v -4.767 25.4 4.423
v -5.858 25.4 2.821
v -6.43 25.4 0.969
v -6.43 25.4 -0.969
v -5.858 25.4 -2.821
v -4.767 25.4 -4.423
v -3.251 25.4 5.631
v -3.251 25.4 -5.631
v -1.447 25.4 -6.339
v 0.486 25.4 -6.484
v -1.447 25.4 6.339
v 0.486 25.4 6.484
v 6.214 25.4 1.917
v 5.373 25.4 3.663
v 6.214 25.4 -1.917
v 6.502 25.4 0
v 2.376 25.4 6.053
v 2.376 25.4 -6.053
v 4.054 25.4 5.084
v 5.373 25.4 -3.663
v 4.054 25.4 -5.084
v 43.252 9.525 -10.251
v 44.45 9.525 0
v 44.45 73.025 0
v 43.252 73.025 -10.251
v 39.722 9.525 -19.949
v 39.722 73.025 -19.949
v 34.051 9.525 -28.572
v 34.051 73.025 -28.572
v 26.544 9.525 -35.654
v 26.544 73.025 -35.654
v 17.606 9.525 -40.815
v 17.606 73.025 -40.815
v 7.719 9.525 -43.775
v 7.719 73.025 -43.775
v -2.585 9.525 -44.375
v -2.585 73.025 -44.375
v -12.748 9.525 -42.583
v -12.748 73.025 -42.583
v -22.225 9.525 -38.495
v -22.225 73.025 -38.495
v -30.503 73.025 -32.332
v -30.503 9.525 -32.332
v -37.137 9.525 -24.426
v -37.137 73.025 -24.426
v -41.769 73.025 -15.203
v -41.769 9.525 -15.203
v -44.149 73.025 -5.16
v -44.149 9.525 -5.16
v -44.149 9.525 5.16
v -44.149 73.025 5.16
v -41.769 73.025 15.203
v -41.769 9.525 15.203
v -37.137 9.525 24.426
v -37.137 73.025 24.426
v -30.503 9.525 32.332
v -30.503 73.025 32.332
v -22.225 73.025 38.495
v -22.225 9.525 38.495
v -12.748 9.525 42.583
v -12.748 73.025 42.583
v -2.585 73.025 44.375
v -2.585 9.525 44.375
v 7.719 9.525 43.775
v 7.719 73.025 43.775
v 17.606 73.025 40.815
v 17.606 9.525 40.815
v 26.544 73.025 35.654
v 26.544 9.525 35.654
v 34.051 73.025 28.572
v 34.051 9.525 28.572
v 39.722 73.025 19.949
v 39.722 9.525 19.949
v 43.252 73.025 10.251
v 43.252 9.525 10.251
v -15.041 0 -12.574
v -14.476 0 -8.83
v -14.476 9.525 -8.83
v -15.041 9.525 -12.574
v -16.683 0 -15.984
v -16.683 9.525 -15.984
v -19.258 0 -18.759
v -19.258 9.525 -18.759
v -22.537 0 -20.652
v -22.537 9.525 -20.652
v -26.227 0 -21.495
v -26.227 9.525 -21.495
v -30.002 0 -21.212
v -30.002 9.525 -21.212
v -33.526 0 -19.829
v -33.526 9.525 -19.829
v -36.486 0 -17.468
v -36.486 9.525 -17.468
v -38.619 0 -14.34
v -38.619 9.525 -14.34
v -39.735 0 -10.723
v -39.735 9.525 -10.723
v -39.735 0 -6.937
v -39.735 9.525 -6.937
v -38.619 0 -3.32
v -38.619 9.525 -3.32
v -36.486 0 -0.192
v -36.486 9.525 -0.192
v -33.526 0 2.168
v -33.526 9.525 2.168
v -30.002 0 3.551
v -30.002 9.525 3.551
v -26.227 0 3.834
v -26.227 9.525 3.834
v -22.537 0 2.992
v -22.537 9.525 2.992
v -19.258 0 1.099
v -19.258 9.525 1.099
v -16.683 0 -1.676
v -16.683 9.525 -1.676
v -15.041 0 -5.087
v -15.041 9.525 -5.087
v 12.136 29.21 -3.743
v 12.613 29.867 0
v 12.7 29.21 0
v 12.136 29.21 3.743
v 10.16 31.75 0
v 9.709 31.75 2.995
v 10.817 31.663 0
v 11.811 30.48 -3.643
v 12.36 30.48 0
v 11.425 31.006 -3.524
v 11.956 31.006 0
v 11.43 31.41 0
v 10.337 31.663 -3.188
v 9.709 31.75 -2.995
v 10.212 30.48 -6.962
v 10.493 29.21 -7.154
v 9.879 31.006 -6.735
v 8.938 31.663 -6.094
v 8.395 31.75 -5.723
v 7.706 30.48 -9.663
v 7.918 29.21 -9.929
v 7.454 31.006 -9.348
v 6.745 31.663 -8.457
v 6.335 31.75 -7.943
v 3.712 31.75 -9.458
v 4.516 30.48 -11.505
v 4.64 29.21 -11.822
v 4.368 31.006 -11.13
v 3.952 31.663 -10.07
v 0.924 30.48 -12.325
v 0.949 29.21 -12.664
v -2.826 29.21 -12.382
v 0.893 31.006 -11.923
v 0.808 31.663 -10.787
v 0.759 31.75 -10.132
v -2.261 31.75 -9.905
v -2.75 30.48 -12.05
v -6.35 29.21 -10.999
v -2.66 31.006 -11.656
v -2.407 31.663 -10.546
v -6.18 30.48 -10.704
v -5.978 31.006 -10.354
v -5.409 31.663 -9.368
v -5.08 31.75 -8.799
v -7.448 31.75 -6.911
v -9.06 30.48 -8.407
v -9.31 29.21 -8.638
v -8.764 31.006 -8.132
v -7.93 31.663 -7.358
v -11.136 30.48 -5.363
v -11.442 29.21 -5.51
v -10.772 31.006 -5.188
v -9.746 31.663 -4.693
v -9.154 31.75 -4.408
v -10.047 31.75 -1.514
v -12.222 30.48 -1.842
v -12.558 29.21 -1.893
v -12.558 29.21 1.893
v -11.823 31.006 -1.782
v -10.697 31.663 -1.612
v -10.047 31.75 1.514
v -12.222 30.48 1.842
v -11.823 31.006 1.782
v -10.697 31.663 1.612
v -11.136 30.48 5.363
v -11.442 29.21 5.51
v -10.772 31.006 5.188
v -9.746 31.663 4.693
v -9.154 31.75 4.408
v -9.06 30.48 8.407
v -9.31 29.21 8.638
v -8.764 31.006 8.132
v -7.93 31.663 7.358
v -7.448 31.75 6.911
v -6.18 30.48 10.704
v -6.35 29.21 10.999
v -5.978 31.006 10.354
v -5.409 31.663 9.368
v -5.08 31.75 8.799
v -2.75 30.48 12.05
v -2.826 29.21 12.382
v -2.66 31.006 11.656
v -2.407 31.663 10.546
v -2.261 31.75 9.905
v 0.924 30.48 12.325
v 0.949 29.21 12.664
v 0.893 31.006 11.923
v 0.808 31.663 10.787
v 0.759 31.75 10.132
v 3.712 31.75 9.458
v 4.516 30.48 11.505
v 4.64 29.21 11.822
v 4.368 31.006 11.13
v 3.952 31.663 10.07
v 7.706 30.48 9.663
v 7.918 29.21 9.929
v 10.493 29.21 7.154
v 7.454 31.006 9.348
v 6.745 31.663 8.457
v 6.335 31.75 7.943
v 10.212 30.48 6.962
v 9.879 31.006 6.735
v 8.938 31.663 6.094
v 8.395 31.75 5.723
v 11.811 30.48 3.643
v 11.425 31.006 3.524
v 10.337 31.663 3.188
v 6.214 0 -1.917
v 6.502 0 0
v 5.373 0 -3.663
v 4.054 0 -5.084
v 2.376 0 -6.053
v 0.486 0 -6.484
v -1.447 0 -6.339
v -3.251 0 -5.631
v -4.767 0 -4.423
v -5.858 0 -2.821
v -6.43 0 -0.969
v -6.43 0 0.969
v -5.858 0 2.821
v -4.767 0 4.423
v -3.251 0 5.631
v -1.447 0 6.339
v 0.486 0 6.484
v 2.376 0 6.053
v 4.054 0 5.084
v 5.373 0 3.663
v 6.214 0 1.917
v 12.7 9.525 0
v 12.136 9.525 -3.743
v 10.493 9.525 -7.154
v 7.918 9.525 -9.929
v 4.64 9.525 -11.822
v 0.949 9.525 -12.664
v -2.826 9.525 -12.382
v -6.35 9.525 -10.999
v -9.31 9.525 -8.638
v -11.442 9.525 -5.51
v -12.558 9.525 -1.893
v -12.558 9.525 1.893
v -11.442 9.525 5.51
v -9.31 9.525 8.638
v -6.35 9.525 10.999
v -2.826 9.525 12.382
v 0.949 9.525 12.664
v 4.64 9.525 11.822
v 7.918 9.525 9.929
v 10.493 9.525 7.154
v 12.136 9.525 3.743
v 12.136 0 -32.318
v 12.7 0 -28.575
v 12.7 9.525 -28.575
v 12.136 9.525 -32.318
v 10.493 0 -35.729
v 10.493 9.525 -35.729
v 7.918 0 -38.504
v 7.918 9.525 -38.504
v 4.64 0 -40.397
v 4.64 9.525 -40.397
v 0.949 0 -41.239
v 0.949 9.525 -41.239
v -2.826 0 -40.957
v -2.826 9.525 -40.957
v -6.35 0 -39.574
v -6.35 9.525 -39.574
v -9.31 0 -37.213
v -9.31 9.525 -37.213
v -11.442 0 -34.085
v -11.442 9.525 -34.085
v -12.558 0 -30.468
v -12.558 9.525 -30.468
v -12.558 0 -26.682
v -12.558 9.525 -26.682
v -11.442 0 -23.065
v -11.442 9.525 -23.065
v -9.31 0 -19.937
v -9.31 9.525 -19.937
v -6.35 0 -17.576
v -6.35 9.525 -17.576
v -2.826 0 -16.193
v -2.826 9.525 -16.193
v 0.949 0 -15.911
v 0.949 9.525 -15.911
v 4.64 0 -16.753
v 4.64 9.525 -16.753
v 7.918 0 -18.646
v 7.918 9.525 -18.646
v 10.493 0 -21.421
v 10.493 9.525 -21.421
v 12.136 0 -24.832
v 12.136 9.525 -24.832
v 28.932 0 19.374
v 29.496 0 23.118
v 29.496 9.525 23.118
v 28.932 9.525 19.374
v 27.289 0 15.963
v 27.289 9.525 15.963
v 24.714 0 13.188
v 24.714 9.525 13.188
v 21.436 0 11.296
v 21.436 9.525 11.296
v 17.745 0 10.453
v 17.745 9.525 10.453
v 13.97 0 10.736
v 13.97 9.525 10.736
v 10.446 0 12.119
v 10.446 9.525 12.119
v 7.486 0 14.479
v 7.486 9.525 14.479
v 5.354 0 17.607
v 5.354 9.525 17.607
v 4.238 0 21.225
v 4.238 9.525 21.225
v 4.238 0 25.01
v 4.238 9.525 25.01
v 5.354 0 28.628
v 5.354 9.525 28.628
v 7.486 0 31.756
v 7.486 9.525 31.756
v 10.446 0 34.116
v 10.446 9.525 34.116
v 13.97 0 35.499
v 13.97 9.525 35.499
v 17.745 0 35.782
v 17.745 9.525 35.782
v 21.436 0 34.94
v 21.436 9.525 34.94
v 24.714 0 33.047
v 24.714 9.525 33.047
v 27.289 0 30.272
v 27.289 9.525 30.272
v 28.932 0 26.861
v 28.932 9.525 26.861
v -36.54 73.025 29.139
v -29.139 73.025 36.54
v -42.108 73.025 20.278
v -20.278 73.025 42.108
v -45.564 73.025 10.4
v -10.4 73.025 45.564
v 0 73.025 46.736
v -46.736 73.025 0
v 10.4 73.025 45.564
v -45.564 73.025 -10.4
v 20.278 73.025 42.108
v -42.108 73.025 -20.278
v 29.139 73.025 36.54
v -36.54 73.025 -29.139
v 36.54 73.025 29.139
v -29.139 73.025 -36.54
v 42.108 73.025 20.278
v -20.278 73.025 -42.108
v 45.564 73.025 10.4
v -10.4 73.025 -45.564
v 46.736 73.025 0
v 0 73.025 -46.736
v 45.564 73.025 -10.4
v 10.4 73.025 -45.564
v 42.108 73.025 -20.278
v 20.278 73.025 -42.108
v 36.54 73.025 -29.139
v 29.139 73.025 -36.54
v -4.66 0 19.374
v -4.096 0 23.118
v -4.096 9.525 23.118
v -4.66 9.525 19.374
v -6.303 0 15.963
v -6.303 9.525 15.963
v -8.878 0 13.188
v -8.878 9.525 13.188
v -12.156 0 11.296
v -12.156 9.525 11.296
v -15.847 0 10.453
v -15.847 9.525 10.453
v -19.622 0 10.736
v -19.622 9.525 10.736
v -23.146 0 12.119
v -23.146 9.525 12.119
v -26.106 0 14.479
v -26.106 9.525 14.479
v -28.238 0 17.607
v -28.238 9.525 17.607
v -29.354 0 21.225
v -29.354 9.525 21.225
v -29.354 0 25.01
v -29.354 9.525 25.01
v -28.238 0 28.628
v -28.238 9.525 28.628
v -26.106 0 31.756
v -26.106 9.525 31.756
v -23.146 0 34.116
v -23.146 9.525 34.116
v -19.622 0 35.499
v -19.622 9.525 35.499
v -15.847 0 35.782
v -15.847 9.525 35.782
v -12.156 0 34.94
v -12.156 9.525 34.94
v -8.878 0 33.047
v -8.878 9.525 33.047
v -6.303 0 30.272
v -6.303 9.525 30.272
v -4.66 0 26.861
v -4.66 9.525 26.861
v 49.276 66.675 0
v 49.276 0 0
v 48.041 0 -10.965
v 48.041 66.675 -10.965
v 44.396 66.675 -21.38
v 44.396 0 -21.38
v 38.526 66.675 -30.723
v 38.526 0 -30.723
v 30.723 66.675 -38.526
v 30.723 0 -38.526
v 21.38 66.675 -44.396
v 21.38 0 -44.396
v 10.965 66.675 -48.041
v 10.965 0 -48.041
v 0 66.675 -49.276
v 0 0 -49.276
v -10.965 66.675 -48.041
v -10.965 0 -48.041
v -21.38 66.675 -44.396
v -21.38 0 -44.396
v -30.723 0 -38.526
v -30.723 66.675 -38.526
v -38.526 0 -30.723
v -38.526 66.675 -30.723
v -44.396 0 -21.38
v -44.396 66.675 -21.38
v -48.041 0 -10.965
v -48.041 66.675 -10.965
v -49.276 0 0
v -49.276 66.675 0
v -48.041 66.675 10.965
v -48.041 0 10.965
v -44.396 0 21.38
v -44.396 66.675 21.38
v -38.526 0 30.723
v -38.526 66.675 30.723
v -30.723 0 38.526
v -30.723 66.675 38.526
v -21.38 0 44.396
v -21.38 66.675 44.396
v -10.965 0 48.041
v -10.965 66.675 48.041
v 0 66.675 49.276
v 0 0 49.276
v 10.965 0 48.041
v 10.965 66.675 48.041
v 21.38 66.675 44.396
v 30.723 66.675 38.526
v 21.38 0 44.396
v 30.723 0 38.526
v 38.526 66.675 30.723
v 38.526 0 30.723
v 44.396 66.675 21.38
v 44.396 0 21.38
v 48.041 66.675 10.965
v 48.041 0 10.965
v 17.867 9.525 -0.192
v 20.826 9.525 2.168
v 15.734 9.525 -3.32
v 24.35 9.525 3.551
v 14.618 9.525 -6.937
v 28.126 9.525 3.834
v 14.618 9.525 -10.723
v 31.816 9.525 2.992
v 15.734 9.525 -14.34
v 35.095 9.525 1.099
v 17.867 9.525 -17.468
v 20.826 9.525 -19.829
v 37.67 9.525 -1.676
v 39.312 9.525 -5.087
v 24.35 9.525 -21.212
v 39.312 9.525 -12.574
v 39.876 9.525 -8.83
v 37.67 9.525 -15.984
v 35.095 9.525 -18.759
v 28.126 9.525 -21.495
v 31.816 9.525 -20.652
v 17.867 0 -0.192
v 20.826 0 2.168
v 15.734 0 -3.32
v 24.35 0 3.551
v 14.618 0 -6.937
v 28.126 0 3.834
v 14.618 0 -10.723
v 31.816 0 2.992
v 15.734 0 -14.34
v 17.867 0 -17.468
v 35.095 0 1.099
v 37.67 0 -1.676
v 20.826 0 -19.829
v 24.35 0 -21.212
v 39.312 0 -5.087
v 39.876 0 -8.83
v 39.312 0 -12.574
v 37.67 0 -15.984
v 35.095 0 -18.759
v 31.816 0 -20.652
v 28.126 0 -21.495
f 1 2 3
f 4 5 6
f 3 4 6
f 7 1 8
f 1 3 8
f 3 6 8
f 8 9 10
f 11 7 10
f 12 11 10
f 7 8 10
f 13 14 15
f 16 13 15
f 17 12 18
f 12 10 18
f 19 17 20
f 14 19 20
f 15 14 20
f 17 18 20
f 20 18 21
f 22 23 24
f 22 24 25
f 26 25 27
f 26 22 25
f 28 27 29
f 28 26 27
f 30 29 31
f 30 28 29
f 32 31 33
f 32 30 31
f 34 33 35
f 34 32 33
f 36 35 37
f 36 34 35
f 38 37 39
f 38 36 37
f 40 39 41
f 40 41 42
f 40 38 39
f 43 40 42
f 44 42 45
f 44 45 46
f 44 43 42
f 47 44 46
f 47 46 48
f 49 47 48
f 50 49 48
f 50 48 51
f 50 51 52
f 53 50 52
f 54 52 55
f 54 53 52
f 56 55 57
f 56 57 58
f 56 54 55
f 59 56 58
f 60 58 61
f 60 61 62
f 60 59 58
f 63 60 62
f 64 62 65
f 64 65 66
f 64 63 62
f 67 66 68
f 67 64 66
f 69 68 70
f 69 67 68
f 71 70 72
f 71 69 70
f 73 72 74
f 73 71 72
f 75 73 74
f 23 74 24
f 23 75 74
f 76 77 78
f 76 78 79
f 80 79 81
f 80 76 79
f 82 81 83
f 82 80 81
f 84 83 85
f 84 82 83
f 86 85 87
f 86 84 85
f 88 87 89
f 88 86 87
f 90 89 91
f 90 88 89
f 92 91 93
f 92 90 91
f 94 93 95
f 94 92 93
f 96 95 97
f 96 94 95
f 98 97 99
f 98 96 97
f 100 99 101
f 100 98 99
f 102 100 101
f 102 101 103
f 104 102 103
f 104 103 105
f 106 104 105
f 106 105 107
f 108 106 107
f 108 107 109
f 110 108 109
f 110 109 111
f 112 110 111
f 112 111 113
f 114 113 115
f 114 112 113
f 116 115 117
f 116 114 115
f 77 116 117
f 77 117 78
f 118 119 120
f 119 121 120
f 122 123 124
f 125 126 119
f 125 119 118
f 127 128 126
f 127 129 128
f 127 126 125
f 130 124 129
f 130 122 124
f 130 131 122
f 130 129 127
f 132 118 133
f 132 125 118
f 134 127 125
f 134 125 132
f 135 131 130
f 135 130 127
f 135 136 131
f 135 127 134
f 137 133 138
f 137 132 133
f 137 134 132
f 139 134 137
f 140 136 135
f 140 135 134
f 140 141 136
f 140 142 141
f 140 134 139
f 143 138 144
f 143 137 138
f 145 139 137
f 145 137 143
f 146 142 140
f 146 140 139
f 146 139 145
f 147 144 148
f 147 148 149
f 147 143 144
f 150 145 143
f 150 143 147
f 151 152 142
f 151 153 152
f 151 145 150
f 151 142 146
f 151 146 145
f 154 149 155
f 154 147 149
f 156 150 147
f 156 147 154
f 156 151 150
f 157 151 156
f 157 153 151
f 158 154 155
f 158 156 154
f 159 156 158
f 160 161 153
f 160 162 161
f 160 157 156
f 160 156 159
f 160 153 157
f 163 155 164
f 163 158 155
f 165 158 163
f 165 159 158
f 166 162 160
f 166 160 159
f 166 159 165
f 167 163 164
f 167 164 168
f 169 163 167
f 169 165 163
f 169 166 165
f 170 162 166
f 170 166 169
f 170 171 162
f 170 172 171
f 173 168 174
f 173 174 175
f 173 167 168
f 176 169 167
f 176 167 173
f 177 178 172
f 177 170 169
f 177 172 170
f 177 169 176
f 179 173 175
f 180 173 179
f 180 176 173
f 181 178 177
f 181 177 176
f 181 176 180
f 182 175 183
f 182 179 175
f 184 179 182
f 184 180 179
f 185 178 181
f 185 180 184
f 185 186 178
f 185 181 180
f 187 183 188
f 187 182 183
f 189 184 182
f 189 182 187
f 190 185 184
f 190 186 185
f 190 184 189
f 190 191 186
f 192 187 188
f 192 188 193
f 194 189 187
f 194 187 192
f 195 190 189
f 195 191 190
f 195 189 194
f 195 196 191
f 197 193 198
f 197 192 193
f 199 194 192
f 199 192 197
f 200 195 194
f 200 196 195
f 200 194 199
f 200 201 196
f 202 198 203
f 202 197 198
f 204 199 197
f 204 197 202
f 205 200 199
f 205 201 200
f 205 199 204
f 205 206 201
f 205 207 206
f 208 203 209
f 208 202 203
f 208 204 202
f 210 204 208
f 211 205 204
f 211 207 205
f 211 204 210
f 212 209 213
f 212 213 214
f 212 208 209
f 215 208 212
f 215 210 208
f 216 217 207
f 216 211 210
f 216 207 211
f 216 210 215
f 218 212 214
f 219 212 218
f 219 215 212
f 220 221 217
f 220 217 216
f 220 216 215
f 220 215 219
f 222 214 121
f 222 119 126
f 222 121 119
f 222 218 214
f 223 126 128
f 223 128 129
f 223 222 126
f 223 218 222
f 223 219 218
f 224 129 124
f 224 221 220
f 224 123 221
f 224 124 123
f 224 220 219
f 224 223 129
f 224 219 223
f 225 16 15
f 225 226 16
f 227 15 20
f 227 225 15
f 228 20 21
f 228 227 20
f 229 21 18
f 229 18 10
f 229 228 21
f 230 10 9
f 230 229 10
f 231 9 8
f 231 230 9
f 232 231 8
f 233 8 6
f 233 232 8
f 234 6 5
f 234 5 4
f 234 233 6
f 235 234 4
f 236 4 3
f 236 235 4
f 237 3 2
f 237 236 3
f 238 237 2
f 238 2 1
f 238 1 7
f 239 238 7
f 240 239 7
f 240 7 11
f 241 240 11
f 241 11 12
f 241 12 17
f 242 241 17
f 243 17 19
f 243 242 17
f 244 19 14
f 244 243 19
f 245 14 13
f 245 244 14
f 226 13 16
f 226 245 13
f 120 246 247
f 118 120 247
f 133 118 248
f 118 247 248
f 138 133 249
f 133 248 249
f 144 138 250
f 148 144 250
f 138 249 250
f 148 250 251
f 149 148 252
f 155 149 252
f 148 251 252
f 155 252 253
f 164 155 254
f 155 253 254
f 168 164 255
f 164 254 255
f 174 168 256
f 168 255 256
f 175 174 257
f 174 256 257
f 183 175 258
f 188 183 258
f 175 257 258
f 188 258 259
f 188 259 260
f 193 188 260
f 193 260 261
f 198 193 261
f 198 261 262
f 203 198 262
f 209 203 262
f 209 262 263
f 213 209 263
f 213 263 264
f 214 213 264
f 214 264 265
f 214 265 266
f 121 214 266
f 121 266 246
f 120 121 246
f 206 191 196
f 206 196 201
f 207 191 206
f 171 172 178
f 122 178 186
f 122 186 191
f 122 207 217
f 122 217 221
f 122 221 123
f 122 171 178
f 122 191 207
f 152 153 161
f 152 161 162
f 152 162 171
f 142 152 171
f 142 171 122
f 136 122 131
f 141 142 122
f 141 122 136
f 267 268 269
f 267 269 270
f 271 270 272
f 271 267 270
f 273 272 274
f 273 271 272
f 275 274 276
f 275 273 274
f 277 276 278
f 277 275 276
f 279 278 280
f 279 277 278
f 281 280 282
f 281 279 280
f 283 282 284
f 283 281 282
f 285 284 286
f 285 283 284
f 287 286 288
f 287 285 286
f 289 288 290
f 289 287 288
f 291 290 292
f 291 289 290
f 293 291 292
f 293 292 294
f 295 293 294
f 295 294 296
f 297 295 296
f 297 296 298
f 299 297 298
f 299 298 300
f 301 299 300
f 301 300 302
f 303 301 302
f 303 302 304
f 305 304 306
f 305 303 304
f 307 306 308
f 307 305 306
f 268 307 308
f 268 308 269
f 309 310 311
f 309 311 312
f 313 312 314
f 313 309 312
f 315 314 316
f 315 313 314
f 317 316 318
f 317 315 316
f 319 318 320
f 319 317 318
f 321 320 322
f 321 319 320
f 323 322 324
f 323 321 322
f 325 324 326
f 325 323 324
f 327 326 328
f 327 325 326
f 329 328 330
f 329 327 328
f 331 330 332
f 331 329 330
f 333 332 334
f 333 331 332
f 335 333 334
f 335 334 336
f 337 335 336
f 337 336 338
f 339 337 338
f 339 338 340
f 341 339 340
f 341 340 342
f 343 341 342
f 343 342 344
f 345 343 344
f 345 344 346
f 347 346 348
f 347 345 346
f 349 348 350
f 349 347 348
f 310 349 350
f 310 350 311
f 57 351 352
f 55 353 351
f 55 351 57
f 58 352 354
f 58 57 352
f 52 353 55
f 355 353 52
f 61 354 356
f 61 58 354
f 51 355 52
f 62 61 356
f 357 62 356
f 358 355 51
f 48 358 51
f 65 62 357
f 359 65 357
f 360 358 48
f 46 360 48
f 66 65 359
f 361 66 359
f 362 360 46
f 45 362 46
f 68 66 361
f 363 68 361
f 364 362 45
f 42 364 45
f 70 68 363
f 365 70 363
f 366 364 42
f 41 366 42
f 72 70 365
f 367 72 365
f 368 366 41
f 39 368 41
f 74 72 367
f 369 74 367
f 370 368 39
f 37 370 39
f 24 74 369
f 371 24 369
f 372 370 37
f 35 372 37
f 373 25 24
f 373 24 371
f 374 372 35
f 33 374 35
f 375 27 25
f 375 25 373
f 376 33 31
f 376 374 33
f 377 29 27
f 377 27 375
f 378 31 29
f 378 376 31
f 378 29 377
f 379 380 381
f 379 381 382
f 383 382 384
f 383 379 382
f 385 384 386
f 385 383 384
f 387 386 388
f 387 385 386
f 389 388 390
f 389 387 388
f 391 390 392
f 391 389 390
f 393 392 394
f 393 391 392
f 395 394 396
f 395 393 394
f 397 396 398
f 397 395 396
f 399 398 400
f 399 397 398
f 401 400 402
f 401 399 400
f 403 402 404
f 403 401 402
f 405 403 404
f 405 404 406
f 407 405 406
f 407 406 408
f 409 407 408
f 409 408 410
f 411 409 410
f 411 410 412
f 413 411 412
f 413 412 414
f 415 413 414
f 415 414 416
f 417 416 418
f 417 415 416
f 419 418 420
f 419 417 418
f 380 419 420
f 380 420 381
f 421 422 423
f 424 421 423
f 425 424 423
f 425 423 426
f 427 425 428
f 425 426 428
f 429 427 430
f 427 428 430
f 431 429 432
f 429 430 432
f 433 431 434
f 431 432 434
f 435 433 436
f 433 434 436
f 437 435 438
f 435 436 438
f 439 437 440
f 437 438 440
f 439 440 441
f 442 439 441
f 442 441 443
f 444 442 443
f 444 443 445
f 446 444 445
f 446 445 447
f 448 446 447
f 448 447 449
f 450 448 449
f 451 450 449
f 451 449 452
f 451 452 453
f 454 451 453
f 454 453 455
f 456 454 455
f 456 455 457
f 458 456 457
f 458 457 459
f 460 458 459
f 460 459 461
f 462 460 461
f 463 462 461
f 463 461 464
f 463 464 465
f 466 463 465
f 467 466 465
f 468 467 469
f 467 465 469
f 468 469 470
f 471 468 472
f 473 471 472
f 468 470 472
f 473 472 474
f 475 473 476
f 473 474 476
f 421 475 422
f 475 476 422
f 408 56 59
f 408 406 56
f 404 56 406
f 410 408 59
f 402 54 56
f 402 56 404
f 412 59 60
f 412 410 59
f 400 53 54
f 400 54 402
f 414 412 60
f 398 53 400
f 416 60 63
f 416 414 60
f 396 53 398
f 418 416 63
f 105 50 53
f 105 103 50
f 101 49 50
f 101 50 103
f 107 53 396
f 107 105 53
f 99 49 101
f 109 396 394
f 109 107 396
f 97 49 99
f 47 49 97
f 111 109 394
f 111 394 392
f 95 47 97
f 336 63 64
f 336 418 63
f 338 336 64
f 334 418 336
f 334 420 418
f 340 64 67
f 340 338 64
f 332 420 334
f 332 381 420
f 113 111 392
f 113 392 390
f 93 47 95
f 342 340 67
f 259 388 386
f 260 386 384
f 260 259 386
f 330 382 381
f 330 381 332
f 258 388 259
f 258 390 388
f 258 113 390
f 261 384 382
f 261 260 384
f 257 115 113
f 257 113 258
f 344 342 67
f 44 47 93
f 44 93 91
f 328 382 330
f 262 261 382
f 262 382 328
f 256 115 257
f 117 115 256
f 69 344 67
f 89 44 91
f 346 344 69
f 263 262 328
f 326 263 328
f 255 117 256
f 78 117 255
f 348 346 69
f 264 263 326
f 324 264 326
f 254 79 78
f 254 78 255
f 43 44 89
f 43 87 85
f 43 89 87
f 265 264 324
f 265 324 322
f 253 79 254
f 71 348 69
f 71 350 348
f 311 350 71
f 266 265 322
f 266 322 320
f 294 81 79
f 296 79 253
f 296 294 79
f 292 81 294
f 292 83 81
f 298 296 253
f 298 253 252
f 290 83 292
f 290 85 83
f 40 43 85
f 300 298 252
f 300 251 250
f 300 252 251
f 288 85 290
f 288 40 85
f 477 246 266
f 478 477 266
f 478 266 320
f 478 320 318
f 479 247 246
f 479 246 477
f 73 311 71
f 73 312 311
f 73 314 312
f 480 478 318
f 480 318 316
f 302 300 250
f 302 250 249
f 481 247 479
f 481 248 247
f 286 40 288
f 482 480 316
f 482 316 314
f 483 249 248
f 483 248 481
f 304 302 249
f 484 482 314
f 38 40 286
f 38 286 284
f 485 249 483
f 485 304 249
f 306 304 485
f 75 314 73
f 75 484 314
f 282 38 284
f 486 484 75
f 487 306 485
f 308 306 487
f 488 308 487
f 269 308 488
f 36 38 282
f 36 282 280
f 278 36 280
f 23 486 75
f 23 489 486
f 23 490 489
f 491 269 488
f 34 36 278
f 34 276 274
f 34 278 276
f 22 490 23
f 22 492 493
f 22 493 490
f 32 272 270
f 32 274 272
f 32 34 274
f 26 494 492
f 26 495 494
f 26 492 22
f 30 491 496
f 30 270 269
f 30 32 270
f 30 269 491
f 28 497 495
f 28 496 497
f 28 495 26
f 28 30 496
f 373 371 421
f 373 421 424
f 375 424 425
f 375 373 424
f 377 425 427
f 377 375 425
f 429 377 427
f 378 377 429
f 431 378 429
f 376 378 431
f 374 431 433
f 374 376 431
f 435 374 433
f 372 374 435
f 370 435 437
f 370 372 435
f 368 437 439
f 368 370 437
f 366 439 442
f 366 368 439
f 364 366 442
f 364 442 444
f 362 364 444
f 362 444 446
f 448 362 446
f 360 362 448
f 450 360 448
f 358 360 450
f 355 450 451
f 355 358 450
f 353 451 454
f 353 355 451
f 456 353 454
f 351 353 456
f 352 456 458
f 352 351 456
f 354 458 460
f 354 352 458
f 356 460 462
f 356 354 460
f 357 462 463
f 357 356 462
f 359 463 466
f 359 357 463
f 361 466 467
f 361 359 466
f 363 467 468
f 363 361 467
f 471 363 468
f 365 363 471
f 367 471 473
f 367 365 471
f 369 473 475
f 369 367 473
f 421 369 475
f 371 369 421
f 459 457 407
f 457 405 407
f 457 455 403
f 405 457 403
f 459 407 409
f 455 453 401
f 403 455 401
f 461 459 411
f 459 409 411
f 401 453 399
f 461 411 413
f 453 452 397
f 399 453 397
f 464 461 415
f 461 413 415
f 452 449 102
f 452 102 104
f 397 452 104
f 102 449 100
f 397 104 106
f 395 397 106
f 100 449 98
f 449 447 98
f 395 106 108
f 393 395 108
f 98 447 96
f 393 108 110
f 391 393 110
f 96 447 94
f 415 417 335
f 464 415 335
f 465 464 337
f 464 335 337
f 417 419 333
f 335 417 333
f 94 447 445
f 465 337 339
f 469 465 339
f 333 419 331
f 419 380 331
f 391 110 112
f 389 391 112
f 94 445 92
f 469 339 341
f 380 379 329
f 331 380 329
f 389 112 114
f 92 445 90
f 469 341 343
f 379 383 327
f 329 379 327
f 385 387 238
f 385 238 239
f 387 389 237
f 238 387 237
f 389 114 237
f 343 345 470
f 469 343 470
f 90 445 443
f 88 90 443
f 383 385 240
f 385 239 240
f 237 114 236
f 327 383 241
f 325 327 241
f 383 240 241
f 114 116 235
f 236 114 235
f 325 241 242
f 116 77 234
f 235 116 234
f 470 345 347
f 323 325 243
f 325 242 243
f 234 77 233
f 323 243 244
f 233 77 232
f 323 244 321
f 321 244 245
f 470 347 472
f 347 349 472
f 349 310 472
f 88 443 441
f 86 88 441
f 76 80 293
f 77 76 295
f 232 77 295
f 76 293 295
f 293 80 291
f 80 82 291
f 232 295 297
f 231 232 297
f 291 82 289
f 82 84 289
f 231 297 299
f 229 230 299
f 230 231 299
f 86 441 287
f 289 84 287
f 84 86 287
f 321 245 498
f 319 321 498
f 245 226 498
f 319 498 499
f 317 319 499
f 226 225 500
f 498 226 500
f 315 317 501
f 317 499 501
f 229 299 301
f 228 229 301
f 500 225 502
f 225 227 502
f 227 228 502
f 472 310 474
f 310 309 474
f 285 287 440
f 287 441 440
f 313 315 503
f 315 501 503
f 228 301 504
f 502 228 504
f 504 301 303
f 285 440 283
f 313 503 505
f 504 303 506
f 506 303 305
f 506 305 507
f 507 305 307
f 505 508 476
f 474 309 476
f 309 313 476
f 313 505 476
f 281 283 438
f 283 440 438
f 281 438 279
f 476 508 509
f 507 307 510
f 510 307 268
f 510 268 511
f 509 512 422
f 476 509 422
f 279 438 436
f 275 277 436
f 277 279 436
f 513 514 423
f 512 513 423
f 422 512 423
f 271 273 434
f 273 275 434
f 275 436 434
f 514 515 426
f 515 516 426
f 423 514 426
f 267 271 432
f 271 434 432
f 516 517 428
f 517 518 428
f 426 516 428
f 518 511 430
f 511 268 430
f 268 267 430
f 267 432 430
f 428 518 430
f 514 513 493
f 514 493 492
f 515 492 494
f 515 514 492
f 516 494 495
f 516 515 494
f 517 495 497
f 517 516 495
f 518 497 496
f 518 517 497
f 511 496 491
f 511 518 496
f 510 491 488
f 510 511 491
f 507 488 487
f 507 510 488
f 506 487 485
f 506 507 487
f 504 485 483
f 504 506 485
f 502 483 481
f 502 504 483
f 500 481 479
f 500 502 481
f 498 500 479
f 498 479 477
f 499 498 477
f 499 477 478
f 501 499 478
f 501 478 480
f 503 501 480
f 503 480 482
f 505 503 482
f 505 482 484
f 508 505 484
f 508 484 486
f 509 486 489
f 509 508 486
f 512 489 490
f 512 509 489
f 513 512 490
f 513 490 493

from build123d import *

# Parameters (mm, degrees)
SKETCH1_R           = 49.276
SKETCH1_R_2         = 6.5024
SKETCH1_R_3         = 12.7
BOSS_EXTRUDE1_DEPTH = 9.525
SKETCH2_R           = 49.276
SKETCH2_R_2         = 44.45
BOSS_EXTRUDE2_DEPTH = 63.5
SKETCH3_R           = 12.7
SKETCH3_R_2         = 6.5024
BOSS_EXTRUDE3_DEPTH = 15.875
CHAMFER1_SIZE       = 6.35
CHAMFER1_SIZE2      = 2.54
SKETCH4_R           = 12.7
BOSS_EXTRUDE4_DEPTH = 6.35
FILLET1_R           = 2.54


with BuildPart() as part:
    # Sketch1 → Boss-Extrude1 (new body)
    with BuildSketch(Plane(origin=(0, 0, 0), x_dir=(1, 0, 0), z_dir=(0, 1, 0))):
        Circle(SKETCH1_R)
        Circle(SKETCH1_R_2, mode=Mode.SUBTRACT)
        with Locations((0, 28.575)):
            Circle(SKETCH1_R_3, mode=Mode.SUBTRACT)
        with Locations((27.176439953, 8.830160614)):
            Circle(SKETCH1_R_3, mode=Mode.SUBTRACT)
        with Locations((16.795963584, -23.117660614)):
            Circle(SKETCH1_R_3, mode=Mode.SUBTRACT)
        with Locations((-16.795963584, -23.117660614)):
            Circle(SKETCH1_R_3, mode=Mode.SUBTRACT)
        with Locations((-27.176439953, 8.830160614)):
            Circle(SKETCH1_R_3, mode=Mode.SUBTRACT)
    extrude(amount=BOSS_EXTRUDE1_DEPTH)

    # Sketch2 → Boss-Extrude2 (add)
    with BuildSketch(Plane(origin=(0, 9.525, 0), x_dir=(1, 0, 0), z_dir=(0, 1, 0))):
        Circle(SKETCH2_R)
        Circle(SKETCH2_R_2, mode=Mode.SUBTRACT)
    extrude(amount=BOSS_EXTRUDE2_DEPTH)

    # Sketch3 → Boss-Extrude3 (add)
    with BuildSketch(Plane(origin=(0, 9.525, 0), x_dir=(1, 0, 0), z_dir=(0, 1, 0))):
        Circle(SKETCH3_R)
        Circle(SKETCH3_R_2, mode=Mode.SUBTRACT)
    extrude(amount=BOSS_EXTRUDE3_DEPTH)

    # Chamfer1
    chamfer1_edges = [part.edges().sort_by_distance(p)[0] for p in [
        (-49.276, 73.025, 0),
    ]]
    chamfer1_side = [part.faces().sort_by_distance(p)[0] for p in [
        (-49.276, 36.5125, 0),
    ]]
    chamfer(chamfer1_edges, length=CHAMFER1_SIZE, length2=CHAMFER1_SIZE2, reference=chamfer1_side[0])

    # Sketch4 → Boss-Extrude4 (add)
    with BuildSketch(Plane(origin=(0, 25.4, 0), x_dir=(1, 0, 0), z_dir=(0, 1, 0))):
        Circle(SKETCH4_R)
    extrude(amount=BOSS_EXTRUDE4_DEPTH)

    # Fillet1
    fillet1_edges = [part.edges().sort_by_distance(p)[0] for p in [
        (-12.7, 31.75, 0),
    ]]
    fillet(fillet1_edges, radius=FILLET1_R)


solid = part.part
